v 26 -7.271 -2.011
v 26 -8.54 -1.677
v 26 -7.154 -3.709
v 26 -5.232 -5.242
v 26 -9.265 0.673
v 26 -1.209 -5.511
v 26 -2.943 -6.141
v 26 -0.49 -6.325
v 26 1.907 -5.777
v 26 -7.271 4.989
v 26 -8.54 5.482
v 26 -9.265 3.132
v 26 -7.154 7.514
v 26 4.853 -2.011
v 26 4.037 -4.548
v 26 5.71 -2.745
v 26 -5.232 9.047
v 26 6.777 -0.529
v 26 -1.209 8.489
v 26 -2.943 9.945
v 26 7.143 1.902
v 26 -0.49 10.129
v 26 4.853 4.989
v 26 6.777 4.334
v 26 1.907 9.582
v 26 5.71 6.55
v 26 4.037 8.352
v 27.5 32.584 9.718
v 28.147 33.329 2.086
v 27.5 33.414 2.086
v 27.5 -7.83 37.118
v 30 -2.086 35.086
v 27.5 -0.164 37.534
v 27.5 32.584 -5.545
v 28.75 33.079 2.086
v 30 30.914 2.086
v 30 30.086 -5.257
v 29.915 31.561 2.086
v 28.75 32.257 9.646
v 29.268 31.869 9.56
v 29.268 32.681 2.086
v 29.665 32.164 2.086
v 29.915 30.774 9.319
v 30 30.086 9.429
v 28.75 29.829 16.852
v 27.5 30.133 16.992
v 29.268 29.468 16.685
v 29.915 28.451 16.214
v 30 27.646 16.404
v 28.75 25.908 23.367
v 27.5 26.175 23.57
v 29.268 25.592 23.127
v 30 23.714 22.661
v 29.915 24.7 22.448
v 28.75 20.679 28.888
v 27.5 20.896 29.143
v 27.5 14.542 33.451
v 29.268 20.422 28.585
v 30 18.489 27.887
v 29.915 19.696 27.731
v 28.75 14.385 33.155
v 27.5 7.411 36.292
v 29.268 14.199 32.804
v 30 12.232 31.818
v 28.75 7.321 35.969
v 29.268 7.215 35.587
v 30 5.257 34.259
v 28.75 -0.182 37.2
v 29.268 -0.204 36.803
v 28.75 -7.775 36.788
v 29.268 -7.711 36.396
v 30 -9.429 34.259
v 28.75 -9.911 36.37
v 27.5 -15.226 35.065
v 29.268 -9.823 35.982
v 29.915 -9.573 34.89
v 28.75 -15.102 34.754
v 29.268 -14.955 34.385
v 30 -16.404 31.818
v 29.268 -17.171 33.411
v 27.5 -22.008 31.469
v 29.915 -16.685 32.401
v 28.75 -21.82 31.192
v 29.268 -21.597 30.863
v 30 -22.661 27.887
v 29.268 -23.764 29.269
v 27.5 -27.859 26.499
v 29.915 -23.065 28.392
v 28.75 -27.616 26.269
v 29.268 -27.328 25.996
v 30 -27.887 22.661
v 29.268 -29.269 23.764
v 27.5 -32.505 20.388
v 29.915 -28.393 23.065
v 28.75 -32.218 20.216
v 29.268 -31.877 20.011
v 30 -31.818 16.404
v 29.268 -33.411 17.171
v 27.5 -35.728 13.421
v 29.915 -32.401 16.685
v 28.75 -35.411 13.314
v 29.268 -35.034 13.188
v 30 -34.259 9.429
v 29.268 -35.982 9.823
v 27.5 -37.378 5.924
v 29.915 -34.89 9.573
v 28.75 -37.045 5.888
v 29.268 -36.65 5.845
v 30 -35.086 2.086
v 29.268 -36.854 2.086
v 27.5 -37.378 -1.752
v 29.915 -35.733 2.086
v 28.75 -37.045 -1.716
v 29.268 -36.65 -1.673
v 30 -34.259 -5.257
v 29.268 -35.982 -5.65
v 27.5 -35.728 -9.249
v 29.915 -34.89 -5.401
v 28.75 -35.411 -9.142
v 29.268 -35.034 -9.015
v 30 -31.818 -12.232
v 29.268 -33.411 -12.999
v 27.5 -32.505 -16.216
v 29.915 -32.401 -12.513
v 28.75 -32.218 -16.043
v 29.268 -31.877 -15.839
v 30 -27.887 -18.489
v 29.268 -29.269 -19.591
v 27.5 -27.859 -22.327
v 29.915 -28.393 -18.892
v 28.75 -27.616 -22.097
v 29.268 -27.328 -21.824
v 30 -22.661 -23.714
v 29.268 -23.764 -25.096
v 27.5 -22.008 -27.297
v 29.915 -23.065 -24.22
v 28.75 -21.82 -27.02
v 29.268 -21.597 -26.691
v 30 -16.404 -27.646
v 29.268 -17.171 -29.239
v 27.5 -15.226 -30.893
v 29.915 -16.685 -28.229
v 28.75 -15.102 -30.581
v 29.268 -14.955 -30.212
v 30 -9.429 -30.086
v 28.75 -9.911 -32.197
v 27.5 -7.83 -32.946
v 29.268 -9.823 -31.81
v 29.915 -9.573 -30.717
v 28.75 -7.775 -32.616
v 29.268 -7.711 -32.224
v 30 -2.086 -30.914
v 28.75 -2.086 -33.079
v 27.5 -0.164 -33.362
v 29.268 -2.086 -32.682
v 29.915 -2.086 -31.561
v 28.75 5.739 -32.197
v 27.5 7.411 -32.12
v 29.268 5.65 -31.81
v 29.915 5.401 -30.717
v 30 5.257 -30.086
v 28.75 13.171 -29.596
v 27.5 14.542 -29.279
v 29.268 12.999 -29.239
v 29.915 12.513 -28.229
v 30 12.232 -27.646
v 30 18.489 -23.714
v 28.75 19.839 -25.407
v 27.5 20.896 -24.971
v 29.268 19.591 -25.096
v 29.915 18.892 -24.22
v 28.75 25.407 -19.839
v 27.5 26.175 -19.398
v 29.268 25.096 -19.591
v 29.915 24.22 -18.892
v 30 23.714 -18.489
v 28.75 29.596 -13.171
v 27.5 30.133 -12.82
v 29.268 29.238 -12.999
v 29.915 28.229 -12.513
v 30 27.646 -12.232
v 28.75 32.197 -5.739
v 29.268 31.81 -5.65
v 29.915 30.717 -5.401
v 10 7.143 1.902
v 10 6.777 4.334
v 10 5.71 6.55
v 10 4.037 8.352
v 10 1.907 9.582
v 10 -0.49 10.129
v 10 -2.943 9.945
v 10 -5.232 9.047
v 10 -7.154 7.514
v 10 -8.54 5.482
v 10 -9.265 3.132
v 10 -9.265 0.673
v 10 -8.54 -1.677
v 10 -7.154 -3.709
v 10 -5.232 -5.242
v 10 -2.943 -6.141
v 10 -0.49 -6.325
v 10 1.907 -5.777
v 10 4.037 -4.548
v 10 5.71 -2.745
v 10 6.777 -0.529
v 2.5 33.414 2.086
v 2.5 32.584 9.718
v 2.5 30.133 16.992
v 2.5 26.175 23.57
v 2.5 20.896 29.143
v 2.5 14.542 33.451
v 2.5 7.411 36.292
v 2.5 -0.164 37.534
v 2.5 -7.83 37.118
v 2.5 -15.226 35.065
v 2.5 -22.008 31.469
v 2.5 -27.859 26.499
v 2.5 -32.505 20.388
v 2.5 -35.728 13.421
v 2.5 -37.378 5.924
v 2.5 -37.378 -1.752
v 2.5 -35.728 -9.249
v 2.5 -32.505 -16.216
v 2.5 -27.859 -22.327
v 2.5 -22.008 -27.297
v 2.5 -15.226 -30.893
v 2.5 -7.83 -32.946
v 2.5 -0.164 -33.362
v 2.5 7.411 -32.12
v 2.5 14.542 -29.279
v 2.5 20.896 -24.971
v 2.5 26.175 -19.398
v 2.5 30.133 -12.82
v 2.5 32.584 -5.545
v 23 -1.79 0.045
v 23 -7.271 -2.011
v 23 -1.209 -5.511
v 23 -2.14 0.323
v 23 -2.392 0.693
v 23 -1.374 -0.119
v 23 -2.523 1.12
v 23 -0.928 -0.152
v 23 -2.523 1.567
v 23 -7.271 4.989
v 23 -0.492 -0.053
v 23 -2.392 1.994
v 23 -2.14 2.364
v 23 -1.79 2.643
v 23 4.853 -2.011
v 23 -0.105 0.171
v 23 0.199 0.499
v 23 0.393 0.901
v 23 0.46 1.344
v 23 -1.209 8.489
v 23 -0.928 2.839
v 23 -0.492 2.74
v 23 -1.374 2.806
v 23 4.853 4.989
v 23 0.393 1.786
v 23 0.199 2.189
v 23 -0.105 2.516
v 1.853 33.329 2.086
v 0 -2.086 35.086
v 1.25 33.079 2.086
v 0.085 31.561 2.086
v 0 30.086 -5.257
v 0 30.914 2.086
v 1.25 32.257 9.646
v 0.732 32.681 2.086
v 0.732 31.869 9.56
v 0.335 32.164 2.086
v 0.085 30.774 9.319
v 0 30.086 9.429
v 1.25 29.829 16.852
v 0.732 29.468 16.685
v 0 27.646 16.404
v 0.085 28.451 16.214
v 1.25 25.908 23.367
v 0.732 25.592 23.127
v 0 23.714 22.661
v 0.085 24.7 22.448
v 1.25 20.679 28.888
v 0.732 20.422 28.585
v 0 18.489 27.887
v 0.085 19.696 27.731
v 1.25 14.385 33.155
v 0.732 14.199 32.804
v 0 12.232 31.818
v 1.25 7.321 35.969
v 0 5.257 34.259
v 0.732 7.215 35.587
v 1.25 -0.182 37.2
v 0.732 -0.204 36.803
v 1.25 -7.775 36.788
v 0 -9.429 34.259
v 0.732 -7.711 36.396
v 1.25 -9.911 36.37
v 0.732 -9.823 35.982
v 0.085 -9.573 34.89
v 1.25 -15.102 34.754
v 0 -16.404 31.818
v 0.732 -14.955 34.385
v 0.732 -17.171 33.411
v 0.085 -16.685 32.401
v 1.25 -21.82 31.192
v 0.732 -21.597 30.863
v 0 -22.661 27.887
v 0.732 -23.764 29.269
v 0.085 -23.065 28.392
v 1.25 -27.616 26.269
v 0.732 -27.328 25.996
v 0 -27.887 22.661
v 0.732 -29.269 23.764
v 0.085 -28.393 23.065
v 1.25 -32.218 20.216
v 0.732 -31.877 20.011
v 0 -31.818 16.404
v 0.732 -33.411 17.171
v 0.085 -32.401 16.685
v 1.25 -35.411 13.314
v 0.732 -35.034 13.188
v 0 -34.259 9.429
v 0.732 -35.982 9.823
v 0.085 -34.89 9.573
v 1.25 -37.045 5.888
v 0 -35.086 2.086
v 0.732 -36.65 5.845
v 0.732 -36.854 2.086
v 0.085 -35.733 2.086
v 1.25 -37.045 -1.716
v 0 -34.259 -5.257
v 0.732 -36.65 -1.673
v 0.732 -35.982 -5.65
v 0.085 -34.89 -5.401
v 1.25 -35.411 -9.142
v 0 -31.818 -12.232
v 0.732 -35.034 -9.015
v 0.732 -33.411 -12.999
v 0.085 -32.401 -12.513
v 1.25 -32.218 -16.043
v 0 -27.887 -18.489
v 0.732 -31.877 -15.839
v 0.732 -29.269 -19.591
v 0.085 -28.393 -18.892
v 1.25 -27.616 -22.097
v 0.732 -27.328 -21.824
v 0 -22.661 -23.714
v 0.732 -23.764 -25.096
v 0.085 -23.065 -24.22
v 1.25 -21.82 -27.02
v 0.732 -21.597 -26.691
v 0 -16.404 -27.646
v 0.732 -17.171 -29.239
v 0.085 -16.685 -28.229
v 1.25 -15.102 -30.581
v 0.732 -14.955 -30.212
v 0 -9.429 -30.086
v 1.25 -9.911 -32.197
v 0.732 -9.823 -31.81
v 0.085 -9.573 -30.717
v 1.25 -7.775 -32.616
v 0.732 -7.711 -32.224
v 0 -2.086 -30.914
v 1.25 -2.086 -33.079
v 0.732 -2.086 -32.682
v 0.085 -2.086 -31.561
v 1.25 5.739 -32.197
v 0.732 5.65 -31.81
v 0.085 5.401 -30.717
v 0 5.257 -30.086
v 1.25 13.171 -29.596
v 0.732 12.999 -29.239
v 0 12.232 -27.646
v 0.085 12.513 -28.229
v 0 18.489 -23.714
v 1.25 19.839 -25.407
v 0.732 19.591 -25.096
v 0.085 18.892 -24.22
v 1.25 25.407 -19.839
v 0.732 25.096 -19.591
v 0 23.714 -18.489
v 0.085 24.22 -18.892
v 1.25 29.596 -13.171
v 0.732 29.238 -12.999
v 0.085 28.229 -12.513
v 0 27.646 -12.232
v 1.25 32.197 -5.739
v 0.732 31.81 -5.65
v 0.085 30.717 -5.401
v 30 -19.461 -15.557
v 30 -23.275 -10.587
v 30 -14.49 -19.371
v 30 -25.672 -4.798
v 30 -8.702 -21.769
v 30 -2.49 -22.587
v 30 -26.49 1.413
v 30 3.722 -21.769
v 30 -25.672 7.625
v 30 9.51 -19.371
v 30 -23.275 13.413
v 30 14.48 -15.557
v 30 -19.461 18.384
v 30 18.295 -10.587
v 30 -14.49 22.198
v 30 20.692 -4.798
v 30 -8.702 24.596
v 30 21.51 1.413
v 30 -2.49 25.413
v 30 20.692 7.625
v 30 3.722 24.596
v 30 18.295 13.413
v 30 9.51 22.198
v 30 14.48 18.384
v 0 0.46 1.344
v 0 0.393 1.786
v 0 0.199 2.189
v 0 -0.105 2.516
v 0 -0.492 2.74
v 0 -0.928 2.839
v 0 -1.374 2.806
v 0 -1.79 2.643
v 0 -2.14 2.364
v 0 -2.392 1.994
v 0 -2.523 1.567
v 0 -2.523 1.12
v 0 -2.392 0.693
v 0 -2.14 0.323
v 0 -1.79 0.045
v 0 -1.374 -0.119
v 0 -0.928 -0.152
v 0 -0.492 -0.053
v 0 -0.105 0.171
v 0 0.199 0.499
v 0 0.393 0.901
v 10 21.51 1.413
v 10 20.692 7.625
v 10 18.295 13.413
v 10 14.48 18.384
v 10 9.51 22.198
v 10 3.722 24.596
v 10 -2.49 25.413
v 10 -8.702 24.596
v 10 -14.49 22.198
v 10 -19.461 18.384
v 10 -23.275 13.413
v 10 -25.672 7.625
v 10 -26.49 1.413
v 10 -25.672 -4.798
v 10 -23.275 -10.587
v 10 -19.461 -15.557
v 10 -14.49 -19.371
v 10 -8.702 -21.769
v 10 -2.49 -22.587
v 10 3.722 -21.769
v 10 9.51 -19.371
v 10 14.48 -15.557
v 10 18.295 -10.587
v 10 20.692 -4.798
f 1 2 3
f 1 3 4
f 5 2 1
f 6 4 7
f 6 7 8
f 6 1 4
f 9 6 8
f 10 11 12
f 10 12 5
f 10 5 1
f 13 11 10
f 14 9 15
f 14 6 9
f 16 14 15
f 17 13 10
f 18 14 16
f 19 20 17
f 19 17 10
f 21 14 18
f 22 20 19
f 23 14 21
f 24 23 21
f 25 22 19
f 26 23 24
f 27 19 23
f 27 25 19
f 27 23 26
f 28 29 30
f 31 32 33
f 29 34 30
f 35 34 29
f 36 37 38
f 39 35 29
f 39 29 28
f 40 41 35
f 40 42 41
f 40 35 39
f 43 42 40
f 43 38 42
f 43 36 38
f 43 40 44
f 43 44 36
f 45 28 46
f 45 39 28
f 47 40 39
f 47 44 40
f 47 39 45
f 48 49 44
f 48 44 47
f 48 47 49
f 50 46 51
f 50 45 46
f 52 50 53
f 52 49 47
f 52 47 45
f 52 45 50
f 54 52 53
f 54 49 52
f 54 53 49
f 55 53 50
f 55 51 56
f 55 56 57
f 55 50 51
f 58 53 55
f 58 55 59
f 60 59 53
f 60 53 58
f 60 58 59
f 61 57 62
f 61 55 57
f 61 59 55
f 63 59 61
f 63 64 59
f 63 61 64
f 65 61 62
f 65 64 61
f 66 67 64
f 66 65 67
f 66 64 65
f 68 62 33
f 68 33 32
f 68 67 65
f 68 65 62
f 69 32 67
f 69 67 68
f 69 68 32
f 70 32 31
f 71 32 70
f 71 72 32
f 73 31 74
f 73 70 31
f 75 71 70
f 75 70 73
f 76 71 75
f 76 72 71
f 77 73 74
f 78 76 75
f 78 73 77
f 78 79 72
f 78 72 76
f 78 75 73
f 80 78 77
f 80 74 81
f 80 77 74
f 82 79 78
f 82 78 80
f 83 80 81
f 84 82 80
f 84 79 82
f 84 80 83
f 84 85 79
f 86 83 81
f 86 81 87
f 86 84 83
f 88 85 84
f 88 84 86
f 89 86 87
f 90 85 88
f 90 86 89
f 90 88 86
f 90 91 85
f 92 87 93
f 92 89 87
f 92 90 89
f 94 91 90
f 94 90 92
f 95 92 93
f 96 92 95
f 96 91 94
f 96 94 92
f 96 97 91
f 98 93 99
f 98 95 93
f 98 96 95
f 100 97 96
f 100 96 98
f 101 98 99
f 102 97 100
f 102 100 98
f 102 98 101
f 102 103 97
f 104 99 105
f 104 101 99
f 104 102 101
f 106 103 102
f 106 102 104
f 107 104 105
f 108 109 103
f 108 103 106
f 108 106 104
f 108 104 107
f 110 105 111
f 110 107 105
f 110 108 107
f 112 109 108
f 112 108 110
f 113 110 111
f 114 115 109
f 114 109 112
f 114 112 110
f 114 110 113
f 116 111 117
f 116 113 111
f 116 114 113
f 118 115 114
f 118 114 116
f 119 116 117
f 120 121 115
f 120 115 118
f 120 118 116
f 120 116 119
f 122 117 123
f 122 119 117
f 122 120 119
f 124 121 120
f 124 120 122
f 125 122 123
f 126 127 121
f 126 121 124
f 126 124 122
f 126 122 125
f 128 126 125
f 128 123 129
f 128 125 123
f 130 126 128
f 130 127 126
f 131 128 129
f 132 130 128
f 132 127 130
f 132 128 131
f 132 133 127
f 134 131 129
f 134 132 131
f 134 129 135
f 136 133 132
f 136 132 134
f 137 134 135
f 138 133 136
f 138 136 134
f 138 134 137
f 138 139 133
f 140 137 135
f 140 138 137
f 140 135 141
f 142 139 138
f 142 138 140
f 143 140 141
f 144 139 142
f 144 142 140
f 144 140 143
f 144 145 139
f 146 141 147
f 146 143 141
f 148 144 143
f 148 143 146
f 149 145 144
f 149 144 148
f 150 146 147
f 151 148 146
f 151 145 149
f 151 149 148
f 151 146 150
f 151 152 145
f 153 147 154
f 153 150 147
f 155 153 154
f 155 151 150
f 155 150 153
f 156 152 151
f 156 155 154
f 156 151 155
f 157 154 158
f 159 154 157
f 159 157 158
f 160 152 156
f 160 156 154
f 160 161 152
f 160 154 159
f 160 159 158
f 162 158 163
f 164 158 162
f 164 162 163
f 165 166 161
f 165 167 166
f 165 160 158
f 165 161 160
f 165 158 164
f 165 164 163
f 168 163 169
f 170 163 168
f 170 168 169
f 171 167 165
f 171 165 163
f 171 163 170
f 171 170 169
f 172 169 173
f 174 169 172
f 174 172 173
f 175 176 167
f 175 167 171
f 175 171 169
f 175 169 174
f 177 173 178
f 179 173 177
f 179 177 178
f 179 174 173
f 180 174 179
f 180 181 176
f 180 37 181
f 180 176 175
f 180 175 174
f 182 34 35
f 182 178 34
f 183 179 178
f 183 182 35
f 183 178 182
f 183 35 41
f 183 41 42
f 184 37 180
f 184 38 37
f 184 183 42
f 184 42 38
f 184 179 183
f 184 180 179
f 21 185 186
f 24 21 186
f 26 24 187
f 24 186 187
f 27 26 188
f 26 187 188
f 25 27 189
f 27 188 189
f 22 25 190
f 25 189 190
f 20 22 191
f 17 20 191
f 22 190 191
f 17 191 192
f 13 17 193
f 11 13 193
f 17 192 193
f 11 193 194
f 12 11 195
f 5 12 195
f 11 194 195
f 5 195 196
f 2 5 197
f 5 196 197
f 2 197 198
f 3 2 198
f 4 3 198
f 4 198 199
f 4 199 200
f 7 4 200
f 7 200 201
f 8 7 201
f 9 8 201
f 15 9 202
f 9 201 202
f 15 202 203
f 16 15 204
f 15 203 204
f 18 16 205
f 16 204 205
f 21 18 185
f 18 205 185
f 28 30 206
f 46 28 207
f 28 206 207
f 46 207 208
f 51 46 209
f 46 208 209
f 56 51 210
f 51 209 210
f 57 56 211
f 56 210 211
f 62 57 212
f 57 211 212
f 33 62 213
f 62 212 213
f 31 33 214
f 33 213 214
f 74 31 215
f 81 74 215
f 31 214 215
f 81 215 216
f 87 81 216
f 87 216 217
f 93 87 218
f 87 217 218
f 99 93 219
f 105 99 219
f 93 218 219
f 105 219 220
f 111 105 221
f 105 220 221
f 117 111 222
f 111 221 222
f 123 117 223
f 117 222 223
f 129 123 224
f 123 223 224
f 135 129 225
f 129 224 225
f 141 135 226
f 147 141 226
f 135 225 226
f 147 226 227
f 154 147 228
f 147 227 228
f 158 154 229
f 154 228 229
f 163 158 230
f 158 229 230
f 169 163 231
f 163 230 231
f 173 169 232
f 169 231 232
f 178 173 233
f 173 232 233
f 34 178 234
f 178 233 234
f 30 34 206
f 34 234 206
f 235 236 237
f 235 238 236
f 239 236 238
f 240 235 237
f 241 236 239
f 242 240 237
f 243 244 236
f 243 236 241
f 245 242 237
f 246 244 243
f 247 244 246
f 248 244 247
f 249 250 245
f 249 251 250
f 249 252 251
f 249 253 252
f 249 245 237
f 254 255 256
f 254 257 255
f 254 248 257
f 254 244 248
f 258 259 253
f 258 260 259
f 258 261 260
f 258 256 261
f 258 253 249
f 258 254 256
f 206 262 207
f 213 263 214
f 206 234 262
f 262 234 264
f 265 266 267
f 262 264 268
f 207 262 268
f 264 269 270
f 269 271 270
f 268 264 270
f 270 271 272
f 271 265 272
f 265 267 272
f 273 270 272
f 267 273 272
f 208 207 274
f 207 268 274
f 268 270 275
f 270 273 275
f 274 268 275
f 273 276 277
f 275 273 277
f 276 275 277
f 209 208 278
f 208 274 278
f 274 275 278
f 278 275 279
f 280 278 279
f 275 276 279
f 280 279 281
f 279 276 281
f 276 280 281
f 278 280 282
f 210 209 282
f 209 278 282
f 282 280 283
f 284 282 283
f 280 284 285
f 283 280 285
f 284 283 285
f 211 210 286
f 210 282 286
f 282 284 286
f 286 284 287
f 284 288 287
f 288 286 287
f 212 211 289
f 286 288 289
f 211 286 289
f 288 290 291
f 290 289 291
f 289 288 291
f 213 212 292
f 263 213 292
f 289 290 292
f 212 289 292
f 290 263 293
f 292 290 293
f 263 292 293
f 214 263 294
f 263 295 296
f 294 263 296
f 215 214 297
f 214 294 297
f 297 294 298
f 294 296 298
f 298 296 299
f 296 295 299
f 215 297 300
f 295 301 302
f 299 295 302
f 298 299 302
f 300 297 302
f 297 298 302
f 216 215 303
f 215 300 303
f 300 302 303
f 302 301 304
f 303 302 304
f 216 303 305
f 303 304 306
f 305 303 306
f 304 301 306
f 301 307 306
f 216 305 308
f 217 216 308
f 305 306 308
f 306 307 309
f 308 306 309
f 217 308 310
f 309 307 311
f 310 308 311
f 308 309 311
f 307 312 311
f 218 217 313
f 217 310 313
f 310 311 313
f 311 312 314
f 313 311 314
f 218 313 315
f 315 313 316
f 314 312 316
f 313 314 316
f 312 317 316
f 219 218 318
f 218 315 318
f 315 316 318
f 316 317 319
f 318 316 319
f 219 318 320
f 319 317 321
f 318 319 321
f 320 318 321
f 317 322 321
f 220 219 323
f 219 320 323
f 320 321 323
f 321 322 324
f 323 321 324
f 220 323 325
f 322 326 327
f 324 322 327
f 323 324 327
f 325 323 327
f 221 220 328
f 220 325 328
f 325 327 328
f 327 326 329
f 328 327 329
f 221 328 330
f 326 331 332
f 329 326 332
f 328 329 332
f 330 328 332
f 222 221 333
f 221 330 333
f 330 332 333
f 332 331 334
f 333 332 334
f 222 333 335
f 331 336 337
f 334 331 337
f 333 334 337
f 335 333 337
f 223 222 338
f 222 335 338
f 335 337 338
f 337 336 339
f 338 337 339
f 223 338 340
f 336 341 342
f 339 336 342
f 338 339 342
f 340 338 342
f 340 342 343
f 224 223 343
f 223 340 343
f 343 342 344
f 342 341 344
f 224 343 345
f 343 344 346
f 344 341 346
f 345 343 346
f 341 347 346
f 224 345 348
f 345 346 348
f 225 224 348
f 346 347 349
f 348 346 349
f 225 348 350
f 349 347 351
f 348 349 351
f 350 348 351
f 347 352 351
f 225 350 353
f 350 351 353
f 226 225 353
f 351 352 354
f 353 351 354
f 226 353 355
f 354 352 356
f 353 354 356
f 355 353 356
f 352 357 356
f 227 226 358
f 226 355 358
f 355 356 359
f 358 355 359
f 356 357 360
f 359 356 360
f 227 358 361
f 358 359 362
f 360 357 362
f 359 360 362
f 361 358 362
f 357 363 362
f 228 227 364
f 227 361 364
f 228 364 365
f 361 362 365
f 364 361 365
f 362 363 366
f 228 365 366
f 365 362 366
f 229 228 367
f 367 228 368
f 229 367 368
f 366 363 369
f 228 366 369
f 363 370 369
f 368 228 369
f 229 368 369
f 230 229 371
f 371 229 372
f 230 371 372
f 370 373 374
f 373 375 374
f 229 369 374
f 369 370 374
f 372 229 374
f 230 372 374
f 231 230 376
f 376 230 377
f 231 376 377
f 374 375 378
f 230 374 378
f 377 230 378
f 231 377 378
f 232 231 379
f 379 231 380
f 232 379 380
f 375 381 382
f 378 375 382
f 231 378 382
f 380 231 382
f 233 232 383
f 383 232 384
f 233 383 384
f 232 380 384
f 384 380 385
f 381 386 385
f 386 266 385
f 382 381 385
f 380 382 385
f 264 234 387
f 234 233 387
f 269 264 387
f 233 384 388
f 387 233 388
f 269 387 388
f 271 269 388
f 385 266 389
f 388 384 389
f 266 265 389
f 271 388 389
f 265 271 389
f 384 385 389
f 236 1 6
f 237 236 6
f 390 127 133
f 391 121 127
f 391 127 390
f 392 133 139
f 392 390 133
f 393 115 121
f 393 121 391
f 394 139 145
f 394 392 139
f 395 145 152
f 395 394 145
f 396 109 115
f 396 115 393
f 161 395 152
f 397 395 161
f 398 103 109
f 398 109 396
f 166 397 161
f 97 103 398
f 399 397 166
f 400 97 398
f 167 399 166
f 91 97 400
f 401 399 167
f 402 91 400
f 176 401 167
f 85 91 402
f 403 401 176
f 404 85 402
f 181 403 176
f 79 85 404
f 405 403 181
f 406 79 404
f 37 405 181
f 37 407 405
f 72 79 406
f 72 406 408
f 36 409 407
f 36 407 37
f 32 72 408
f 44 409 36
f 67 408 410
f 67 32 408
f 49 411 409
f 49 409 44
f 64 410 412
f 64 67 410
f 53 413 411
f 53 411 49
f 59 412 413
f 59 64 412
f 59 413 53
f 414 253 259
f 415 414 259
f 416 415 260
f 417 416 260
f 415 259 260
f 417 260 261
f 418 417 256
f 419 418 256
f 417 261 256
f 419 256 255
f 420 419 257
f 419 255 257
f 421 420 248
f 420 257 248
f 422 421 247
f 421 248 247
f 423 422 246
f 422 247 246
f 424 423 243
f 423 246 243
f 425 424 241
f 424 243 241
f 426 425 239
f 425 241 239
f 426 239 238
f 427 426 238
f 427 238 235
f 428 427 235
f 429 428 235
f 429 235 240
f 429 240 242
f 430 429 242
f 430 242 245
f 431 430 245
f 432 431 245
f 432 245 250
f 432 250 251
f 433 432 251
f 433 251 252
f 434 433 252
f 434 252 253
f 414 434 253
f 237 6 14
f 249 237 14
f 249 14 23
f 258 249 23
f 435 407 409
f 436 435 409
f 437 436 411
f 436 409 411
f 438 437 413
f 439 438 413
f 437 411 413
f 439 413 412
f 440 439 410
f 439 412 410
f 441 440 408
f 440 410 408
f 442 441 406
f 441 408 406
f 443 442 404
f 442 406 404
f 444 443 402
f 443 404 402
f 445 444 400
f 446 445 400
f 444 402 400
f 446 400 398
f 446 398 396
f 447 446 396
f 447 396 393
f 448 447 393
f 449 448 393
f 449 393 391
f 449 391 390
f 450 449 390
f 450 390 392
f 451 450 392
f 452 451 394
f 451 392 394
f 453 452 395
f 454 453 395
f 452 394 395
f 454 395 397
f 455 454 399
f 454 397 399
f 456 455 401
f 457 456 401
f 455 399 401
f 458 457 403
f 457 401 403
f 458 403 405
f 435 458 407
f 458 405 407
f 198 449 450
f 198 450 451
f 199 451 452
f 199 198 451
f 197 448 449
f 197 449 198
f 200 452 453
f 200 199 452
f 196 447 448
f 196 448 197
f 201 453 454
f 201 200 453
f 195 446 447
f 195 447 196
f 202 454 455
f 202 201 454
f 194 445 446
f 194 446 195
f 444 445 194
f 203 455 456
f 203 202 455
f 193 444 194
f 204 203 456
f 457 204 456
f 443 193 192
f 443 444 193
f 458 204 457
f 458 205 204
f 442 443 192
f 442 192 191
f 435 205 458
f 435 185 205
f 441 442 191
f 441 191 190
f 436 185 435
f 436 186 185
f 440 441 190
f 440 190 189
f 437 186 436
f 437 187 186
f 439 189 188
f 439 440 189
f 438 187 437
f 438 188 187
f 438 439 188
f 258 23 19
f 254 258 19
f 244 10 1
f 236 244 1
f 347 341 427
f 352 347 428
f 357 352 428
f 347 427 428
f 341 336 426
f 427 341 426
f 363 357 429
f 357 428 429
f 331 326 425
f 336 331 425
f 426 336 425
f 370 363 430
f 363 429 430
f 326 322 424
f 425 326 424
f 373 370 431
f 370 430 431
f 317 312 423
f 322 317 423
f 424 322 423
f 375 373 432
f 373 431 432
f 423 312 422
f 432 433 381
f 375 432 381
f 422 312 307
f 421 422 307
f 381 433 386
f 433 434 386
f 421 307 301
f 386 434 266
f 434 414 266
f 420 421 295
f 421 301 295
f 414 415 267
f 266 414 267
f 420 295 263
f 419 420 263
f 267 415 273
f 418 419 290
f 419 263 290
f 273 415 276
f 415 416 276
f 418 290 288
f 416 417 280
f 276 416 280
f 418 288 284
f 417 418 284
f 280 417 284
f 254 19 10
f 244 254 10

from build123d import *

# Parameters (mm, degrees)
SKETCH_R        = 35.5
PAD_DEPTH       = 30
FILLET_R        = 2.5
FILLET001_R     = 2.5
SKETCH001_R     = 24
POCKET_DEPTH    = 20
SKETCH002_R     = 8.25
PAD001_DEPTH    = 16
POCKET001_DEPTH = 3
SKETCH004_R     = 1.5
POCKET002_DEPTH = 25


with BuildPart() as part:
    # Sketch → Pad (new body)
    with BuildSketch(Plane.YZ):
        with Locations((-2.086276, 2.086154)):
            Circle(SKETCH_R)
    extrude(amount=PAD_DEPTH)

    # Fillet
    fillet_edges = [part.edges().sort_by_distance(p)[0] for p in [
        (30, -37.586276, 2.086154),
    ]]
    fillet(fillet_edges, radius=FILLET_R)

    # Fillet001
    fillet001_edges = [part.edges().sort_by_distance(p)[0] for p in [
        (0, -37.586276, 2.086154),
    ]]
    fillet(fillet001_edges, radius=FILLET001_R)

    # Sketch001 (on Face3 of Pad) → Pocket (cut)
    with BuildSketch(Plane.YZ.offset(30)):
        with Locations((-2.490074, 1.413427)):
            Circle(SKETCH001_R)
    extrude(amount=-POCKET_DEPTH, mode=Mode.SUBTRACT)

    # Sketch002 (on Face7 of Pocket) → Pad001 (join)
    with BuildSketch(Plane.YZ.offset(10)):
        with Locations((-1.106776, 1.902246)):
            Circle(SKETCH002_R)
    extrude(amount=PAD001_DEPTH)

    # Sketch003 (on Face9 of Pad001) → Pocket001 (cut)
    with BuildSketch(Plane.YZ.offset(26)):
        Polygon((4.852949, 4.988847), (-1.209229, 8.488847), (-7.271407, 4.988847), (-7.271407, -2.011153), (-1.209229, -5.511153), (4.852949, -2.011153), align=None)
    extrude(amount=-POCKET001_DEPTH, mode=Mode.SUBTRACT)

    # Sketch004 (on Face16 of Pocket001) → Pocket002 (cut)
    with BuildSketch(Plane.YZ.offset(23)):
        with Locations((-1.040093, 1.343548)):
            Circle(SKETCH004_R)
    extrude(amount=-POCKET002_DEPTH, mode=Mode.SUBTRACT)


solid = part.part
